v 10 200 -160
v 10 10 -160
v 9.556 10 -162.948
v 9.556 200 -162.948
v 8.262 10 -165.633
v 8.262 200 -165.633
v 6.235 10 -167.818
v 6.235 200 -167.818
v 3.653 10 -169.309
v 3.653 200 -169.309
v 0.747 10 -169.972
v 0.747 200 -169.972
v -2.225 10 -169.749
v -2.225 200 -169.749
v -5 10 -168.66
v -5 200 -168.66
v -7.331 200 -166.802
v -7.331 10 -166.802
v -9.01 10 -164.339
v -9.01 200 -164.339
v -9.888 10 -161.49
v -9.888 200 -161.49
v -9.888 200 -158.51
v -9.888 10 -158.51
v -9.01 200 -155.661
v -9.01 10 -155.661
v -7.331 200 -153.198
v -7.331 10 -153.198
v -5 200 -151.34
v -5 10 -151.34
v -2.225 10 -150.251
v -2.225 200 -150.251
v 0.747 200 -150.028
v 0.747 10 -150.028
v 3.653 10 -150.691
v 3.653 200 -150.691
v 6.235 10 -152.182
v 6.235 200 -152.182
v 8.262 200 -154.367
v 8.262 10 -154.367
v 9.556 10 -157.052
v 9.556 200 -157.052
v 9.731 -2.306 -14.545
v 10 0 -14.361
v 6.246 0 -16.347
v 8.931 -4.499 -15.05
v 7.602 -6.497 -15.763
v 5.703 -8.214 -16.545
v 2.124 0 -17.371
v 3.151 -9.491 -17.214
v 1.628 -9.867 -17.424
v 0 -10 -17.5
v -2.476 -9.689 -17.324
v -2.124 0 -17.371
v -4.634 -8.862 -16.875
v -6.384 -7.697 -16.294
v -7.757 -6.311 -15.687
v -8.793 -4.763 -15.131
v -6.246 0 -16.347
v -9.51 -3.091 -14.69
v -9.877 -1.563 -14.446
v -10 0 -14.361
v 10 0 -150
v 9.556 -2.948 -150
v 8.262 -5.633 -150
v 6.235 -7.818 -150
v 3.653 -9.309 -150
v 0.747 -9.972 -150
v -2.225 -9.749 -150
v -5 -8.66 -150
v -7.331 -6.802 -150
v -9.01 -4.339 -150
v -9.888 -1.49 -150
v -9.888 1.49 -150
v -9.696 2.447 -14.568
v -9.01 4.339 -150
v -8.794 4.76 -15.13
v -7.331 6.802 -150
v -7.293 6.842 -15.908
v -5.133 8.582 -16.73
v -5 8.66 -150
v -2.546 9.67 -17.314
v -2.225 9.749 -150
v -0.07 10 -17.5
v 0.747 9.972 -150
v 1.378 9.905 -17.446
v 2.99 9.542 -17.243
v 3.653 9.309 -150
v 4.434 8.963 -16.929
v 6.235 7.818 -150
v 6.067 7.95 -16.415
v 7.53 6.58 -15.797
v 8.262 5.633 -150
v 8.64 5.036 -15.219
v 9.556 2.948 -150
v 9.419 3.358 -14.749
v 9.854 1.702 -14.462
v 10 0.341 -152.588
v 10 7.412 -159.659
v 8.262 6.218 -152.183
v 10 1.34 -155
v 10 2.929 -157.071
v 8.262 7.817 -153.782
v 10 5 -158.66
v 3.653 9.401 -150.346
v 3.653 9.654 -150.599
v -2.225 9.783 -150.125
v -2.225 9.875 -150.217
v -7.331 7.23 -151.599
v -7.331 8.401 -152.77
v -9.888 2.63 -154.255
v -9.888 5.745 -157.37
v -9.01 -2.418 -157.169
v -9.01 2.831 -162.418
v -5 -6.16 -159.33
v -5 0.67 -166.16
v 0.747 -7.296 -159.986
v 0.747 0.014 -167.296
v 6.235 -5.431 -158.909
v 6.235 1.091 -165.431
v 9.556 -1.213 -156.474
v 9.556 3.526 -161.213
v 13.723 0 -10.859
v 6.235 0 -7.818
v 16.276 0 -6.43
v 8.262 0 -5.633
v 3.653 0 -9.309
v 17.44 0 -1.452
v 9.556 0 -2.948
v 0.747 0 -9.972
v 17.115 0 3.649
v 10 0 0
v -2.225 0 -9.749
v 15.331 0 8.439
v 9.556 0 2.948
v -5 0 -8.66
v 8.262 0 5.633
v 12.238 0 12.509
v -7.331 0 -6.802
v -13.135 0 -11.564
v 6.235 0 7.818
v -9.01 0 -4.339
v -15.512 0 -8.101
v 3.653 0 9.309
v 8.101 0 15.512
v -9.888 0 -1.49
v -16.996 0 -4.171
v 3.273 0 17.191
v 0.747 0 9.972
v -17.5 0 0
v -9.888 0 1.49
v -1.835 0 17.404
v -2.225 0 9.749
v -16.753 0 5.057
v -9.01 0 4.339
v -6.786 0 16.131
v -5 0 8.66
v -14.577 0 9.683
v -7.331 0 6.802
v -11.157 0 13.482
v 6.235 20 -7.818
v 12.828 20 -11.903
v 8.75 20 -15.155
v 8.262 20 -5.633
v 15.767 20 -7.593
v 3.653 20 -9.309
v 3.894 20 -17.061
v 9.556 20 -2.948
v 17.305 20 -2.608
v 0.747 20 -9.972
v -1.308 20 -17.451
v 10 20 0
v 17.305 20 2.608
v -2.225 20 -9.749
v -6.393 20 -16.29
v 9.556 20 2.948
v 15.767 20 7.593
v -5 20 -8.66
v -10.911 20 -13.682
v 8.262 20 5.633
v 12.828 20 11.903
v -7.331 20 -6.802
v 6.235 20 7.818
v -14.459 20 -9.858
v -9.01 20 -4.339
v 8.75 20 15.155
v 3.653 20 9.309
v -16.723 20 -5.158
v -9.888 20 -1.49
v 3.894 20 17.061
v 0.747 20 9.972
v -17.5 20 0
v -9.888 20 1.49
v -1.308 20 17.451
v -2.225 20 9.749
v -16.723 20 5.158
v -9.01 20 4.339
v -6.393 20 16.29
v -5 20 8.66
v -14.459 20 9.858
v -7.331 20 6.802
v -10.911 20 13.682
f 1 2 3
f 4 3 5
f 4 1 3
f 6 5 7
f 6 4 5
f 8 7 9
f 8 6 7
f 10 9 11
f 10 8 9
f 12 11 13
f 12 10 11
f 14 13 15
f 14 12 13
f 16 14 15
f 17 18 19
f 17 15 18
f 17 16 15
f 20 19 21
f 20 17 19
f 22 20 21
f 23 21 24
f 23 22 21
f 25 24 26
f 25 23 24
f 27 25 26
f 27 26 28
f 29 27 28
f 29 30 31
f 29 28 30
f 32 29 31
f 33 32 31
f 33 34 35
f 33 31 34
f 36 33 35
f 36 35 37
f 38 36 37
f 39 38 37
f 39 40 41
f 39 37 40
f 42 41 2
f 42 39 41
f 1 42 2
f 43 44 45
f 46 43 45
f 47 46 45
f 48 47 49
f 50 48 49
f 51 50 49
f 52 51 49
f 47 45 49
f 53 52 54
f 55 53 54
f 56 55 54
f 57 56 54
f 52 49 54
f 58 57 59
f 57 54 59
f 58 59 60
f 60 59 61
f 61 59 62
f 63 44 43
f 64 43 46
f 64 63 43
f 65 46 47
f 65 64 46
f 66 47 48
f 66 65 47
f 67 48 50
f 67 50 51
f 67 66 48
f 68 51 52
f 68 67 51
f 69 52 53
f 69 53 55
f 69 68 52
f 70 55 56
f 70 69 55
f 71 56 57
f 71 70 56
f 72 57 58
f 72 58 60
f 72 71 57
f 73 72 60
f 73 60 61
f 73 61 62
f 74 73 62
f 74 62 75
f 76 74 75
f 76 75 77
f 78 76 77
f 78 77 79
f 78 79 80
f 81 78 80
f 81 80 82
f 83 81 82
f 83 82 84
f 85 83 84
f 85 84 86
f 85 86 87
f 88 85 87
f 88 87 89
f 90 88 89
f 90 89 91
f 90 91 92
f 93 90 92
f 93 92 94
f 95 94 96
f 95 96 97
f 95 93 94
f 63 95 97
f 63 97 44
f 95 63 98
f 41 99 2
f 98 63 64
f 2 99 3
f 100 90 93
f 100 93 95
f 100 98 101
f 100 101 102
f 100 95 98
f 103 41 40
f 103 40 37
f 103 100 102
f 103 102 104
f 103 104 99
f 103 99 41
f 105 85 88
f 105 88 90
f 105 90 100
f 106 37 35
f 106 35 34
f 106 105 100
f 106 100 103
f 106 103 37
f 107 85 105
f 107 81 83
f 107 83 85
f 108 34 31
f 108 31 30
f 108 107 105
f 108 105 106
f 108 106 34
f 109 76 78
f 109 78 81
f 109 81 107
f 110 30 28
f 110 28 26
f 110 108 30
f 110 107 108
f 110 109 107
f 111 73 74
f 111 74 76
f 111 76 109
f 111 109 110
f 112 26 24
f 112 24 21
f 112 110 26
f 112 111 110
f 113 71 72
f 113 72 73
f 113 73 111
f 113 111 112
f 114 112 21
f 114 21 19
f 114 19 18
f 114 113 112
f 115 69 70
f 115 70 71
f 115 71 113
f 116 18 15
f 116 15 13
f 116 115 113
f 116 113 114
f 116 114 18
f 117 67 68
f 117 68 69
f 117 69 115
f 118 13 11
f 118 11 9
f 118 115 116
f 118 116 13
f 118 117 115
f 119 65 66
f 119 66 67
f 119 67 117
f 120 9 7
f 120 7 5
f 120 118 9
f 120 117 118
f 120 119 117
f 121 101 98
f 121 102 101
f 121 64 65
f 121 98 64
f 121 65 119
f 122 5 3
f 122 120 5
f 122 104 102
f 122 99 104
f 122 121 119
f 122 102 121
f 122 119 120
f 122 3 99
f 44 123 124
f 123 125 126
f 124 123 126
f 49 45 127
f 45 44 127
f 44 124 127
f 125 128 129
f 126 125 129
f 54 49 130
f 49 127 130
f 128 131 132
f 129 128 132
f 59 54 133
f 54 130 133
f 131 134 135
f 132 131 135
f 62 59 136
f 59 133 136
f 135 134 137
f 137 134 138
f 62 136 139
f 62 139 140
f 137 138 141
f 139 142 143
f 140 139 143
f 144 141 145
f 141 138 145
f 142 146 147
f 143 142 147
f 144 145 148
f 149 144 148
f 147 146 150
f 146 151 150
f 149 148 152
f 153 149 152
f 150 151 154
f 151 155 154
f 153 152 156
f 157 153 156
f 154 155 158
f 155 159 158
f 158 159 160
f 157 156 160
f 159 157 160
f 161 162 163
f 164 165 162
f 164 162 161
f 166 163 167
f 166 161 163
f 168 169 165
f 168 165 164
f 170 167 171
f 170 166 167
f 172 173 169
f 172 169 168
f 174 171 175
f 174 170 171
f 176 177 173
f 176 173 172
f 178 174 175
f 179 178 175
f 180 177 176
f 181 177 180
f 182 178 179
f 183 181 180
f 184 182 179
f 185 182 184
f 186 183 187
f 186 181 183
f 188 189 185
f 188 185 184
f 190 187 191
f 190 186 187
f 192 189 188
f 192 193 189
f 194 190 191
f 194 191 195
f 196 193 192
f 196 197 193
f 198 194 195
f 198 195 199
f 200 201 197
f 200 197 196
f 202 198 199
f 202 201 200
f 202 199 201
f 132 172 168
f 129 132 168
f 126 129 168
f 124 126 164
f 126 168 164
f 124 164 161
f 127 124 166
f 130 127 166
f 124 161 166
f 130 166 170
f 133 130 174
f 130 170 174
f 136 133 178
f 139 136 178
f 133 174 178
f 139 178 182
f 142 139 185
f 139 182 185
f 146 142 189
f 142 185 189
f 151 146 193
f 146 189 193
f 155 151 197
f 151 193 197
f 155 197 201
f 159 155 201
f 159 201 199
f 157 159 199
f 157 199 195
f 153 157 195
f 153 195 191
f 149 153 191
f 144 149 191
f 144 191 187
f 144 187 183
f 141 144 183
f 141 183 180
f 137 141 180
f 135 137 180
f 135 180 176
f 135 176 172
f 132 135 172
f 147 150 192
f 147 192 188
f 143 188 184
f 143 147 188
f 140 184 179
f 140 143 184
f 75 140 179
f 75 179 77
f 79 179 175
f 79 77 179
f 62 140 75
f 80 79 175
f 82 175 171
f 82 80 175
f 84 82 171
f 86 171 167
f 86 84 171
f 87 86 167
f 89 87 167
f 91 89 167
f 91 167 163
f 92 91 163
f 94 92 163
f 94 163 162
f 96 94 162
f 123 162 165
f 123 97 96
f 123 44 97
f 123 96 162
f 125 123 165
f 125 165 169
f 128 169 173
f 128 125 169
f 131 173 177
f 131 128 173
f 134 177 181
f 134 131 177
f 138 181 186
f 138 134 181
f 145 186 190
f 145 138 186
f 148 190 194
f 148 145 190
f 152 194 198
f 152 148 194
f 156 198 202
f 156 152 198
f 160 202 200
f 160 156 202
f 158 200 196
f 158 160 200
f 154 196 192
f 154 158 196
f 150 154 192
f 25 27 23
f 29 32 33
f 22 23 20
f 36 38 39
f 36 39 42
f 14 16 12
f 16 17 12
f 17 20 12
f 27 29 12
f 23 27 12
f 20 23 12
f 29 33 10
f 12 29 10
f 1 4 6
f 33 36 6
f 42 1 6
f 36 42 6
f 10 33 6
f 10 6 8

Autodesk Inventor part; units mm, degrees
ref_plane "YZ Plane" through (0, 0, 0) normal (1, 0, 0) x (0, 1, 0)
ref_plane "XZ Plane" through (0, 0, 0) normal (0, 1, 0) x (-1, 0, 0)
ref_plane "XY Plane" through (0, 0, 0) normal (0, 0, 1) x (1, 0, 0)
sketch "Sketch1" plane through (0, 0, 0) normal (0, 0, 1) x (1, 0, 0)
  circle A0 centre (0, 0) radius 10
  dimension "d0" = 20
sketch "Sketch2" plane through (0, 0, 0) normal (1, 0, 0) x (0, 1, 0)
  line L0 (0, 0) -> (0, -150)
  line L1 (10, -160) -> (200, -160)
  arc A0 (0, -150) -> (10, -160) centre (10, -150) ccw
  point P0 (0, -160)
  dimension "d1" = 160
  dimension "d2" = 200
  dimension "d3" = 10
sweep "Sweep1" add profiles "Sketch1" path "Sketch2"
thread "Thread1"
sketch "Sketch3" plane through (0, 0, 0) normal (0, 1, 0) x (-1, 0, 0)
  circle A0 centre (0, 0) radius 17.5
  dimension "d8" = 35
extrude "Extrusion1" add sketch "Sketch3" along normal blind 20
sketch "Sketch4" plane through (0, 20, 0) normal (0, 1, 0) x (1, 0, 0)
  circle A0 centre (0, 0) radius 10
  dimension "d11" = 20
extrude "Extrusion2" cut sketch "Sketch4" against normal through all
sketch "Sketch5" plane through (0, 0, 0) normal (0, -1, 0) x (1, 0, 0)
  arc A0 (10, -14.3614) -> (-10, -14.3614) centre (0, 0) ccw projected
  circle A1 centre (0, 0) radius 17.5
  point P0 (-10, -14.3614)
extrude "Extrusion3" cut sketch "Sketch5" along normal blind 10
